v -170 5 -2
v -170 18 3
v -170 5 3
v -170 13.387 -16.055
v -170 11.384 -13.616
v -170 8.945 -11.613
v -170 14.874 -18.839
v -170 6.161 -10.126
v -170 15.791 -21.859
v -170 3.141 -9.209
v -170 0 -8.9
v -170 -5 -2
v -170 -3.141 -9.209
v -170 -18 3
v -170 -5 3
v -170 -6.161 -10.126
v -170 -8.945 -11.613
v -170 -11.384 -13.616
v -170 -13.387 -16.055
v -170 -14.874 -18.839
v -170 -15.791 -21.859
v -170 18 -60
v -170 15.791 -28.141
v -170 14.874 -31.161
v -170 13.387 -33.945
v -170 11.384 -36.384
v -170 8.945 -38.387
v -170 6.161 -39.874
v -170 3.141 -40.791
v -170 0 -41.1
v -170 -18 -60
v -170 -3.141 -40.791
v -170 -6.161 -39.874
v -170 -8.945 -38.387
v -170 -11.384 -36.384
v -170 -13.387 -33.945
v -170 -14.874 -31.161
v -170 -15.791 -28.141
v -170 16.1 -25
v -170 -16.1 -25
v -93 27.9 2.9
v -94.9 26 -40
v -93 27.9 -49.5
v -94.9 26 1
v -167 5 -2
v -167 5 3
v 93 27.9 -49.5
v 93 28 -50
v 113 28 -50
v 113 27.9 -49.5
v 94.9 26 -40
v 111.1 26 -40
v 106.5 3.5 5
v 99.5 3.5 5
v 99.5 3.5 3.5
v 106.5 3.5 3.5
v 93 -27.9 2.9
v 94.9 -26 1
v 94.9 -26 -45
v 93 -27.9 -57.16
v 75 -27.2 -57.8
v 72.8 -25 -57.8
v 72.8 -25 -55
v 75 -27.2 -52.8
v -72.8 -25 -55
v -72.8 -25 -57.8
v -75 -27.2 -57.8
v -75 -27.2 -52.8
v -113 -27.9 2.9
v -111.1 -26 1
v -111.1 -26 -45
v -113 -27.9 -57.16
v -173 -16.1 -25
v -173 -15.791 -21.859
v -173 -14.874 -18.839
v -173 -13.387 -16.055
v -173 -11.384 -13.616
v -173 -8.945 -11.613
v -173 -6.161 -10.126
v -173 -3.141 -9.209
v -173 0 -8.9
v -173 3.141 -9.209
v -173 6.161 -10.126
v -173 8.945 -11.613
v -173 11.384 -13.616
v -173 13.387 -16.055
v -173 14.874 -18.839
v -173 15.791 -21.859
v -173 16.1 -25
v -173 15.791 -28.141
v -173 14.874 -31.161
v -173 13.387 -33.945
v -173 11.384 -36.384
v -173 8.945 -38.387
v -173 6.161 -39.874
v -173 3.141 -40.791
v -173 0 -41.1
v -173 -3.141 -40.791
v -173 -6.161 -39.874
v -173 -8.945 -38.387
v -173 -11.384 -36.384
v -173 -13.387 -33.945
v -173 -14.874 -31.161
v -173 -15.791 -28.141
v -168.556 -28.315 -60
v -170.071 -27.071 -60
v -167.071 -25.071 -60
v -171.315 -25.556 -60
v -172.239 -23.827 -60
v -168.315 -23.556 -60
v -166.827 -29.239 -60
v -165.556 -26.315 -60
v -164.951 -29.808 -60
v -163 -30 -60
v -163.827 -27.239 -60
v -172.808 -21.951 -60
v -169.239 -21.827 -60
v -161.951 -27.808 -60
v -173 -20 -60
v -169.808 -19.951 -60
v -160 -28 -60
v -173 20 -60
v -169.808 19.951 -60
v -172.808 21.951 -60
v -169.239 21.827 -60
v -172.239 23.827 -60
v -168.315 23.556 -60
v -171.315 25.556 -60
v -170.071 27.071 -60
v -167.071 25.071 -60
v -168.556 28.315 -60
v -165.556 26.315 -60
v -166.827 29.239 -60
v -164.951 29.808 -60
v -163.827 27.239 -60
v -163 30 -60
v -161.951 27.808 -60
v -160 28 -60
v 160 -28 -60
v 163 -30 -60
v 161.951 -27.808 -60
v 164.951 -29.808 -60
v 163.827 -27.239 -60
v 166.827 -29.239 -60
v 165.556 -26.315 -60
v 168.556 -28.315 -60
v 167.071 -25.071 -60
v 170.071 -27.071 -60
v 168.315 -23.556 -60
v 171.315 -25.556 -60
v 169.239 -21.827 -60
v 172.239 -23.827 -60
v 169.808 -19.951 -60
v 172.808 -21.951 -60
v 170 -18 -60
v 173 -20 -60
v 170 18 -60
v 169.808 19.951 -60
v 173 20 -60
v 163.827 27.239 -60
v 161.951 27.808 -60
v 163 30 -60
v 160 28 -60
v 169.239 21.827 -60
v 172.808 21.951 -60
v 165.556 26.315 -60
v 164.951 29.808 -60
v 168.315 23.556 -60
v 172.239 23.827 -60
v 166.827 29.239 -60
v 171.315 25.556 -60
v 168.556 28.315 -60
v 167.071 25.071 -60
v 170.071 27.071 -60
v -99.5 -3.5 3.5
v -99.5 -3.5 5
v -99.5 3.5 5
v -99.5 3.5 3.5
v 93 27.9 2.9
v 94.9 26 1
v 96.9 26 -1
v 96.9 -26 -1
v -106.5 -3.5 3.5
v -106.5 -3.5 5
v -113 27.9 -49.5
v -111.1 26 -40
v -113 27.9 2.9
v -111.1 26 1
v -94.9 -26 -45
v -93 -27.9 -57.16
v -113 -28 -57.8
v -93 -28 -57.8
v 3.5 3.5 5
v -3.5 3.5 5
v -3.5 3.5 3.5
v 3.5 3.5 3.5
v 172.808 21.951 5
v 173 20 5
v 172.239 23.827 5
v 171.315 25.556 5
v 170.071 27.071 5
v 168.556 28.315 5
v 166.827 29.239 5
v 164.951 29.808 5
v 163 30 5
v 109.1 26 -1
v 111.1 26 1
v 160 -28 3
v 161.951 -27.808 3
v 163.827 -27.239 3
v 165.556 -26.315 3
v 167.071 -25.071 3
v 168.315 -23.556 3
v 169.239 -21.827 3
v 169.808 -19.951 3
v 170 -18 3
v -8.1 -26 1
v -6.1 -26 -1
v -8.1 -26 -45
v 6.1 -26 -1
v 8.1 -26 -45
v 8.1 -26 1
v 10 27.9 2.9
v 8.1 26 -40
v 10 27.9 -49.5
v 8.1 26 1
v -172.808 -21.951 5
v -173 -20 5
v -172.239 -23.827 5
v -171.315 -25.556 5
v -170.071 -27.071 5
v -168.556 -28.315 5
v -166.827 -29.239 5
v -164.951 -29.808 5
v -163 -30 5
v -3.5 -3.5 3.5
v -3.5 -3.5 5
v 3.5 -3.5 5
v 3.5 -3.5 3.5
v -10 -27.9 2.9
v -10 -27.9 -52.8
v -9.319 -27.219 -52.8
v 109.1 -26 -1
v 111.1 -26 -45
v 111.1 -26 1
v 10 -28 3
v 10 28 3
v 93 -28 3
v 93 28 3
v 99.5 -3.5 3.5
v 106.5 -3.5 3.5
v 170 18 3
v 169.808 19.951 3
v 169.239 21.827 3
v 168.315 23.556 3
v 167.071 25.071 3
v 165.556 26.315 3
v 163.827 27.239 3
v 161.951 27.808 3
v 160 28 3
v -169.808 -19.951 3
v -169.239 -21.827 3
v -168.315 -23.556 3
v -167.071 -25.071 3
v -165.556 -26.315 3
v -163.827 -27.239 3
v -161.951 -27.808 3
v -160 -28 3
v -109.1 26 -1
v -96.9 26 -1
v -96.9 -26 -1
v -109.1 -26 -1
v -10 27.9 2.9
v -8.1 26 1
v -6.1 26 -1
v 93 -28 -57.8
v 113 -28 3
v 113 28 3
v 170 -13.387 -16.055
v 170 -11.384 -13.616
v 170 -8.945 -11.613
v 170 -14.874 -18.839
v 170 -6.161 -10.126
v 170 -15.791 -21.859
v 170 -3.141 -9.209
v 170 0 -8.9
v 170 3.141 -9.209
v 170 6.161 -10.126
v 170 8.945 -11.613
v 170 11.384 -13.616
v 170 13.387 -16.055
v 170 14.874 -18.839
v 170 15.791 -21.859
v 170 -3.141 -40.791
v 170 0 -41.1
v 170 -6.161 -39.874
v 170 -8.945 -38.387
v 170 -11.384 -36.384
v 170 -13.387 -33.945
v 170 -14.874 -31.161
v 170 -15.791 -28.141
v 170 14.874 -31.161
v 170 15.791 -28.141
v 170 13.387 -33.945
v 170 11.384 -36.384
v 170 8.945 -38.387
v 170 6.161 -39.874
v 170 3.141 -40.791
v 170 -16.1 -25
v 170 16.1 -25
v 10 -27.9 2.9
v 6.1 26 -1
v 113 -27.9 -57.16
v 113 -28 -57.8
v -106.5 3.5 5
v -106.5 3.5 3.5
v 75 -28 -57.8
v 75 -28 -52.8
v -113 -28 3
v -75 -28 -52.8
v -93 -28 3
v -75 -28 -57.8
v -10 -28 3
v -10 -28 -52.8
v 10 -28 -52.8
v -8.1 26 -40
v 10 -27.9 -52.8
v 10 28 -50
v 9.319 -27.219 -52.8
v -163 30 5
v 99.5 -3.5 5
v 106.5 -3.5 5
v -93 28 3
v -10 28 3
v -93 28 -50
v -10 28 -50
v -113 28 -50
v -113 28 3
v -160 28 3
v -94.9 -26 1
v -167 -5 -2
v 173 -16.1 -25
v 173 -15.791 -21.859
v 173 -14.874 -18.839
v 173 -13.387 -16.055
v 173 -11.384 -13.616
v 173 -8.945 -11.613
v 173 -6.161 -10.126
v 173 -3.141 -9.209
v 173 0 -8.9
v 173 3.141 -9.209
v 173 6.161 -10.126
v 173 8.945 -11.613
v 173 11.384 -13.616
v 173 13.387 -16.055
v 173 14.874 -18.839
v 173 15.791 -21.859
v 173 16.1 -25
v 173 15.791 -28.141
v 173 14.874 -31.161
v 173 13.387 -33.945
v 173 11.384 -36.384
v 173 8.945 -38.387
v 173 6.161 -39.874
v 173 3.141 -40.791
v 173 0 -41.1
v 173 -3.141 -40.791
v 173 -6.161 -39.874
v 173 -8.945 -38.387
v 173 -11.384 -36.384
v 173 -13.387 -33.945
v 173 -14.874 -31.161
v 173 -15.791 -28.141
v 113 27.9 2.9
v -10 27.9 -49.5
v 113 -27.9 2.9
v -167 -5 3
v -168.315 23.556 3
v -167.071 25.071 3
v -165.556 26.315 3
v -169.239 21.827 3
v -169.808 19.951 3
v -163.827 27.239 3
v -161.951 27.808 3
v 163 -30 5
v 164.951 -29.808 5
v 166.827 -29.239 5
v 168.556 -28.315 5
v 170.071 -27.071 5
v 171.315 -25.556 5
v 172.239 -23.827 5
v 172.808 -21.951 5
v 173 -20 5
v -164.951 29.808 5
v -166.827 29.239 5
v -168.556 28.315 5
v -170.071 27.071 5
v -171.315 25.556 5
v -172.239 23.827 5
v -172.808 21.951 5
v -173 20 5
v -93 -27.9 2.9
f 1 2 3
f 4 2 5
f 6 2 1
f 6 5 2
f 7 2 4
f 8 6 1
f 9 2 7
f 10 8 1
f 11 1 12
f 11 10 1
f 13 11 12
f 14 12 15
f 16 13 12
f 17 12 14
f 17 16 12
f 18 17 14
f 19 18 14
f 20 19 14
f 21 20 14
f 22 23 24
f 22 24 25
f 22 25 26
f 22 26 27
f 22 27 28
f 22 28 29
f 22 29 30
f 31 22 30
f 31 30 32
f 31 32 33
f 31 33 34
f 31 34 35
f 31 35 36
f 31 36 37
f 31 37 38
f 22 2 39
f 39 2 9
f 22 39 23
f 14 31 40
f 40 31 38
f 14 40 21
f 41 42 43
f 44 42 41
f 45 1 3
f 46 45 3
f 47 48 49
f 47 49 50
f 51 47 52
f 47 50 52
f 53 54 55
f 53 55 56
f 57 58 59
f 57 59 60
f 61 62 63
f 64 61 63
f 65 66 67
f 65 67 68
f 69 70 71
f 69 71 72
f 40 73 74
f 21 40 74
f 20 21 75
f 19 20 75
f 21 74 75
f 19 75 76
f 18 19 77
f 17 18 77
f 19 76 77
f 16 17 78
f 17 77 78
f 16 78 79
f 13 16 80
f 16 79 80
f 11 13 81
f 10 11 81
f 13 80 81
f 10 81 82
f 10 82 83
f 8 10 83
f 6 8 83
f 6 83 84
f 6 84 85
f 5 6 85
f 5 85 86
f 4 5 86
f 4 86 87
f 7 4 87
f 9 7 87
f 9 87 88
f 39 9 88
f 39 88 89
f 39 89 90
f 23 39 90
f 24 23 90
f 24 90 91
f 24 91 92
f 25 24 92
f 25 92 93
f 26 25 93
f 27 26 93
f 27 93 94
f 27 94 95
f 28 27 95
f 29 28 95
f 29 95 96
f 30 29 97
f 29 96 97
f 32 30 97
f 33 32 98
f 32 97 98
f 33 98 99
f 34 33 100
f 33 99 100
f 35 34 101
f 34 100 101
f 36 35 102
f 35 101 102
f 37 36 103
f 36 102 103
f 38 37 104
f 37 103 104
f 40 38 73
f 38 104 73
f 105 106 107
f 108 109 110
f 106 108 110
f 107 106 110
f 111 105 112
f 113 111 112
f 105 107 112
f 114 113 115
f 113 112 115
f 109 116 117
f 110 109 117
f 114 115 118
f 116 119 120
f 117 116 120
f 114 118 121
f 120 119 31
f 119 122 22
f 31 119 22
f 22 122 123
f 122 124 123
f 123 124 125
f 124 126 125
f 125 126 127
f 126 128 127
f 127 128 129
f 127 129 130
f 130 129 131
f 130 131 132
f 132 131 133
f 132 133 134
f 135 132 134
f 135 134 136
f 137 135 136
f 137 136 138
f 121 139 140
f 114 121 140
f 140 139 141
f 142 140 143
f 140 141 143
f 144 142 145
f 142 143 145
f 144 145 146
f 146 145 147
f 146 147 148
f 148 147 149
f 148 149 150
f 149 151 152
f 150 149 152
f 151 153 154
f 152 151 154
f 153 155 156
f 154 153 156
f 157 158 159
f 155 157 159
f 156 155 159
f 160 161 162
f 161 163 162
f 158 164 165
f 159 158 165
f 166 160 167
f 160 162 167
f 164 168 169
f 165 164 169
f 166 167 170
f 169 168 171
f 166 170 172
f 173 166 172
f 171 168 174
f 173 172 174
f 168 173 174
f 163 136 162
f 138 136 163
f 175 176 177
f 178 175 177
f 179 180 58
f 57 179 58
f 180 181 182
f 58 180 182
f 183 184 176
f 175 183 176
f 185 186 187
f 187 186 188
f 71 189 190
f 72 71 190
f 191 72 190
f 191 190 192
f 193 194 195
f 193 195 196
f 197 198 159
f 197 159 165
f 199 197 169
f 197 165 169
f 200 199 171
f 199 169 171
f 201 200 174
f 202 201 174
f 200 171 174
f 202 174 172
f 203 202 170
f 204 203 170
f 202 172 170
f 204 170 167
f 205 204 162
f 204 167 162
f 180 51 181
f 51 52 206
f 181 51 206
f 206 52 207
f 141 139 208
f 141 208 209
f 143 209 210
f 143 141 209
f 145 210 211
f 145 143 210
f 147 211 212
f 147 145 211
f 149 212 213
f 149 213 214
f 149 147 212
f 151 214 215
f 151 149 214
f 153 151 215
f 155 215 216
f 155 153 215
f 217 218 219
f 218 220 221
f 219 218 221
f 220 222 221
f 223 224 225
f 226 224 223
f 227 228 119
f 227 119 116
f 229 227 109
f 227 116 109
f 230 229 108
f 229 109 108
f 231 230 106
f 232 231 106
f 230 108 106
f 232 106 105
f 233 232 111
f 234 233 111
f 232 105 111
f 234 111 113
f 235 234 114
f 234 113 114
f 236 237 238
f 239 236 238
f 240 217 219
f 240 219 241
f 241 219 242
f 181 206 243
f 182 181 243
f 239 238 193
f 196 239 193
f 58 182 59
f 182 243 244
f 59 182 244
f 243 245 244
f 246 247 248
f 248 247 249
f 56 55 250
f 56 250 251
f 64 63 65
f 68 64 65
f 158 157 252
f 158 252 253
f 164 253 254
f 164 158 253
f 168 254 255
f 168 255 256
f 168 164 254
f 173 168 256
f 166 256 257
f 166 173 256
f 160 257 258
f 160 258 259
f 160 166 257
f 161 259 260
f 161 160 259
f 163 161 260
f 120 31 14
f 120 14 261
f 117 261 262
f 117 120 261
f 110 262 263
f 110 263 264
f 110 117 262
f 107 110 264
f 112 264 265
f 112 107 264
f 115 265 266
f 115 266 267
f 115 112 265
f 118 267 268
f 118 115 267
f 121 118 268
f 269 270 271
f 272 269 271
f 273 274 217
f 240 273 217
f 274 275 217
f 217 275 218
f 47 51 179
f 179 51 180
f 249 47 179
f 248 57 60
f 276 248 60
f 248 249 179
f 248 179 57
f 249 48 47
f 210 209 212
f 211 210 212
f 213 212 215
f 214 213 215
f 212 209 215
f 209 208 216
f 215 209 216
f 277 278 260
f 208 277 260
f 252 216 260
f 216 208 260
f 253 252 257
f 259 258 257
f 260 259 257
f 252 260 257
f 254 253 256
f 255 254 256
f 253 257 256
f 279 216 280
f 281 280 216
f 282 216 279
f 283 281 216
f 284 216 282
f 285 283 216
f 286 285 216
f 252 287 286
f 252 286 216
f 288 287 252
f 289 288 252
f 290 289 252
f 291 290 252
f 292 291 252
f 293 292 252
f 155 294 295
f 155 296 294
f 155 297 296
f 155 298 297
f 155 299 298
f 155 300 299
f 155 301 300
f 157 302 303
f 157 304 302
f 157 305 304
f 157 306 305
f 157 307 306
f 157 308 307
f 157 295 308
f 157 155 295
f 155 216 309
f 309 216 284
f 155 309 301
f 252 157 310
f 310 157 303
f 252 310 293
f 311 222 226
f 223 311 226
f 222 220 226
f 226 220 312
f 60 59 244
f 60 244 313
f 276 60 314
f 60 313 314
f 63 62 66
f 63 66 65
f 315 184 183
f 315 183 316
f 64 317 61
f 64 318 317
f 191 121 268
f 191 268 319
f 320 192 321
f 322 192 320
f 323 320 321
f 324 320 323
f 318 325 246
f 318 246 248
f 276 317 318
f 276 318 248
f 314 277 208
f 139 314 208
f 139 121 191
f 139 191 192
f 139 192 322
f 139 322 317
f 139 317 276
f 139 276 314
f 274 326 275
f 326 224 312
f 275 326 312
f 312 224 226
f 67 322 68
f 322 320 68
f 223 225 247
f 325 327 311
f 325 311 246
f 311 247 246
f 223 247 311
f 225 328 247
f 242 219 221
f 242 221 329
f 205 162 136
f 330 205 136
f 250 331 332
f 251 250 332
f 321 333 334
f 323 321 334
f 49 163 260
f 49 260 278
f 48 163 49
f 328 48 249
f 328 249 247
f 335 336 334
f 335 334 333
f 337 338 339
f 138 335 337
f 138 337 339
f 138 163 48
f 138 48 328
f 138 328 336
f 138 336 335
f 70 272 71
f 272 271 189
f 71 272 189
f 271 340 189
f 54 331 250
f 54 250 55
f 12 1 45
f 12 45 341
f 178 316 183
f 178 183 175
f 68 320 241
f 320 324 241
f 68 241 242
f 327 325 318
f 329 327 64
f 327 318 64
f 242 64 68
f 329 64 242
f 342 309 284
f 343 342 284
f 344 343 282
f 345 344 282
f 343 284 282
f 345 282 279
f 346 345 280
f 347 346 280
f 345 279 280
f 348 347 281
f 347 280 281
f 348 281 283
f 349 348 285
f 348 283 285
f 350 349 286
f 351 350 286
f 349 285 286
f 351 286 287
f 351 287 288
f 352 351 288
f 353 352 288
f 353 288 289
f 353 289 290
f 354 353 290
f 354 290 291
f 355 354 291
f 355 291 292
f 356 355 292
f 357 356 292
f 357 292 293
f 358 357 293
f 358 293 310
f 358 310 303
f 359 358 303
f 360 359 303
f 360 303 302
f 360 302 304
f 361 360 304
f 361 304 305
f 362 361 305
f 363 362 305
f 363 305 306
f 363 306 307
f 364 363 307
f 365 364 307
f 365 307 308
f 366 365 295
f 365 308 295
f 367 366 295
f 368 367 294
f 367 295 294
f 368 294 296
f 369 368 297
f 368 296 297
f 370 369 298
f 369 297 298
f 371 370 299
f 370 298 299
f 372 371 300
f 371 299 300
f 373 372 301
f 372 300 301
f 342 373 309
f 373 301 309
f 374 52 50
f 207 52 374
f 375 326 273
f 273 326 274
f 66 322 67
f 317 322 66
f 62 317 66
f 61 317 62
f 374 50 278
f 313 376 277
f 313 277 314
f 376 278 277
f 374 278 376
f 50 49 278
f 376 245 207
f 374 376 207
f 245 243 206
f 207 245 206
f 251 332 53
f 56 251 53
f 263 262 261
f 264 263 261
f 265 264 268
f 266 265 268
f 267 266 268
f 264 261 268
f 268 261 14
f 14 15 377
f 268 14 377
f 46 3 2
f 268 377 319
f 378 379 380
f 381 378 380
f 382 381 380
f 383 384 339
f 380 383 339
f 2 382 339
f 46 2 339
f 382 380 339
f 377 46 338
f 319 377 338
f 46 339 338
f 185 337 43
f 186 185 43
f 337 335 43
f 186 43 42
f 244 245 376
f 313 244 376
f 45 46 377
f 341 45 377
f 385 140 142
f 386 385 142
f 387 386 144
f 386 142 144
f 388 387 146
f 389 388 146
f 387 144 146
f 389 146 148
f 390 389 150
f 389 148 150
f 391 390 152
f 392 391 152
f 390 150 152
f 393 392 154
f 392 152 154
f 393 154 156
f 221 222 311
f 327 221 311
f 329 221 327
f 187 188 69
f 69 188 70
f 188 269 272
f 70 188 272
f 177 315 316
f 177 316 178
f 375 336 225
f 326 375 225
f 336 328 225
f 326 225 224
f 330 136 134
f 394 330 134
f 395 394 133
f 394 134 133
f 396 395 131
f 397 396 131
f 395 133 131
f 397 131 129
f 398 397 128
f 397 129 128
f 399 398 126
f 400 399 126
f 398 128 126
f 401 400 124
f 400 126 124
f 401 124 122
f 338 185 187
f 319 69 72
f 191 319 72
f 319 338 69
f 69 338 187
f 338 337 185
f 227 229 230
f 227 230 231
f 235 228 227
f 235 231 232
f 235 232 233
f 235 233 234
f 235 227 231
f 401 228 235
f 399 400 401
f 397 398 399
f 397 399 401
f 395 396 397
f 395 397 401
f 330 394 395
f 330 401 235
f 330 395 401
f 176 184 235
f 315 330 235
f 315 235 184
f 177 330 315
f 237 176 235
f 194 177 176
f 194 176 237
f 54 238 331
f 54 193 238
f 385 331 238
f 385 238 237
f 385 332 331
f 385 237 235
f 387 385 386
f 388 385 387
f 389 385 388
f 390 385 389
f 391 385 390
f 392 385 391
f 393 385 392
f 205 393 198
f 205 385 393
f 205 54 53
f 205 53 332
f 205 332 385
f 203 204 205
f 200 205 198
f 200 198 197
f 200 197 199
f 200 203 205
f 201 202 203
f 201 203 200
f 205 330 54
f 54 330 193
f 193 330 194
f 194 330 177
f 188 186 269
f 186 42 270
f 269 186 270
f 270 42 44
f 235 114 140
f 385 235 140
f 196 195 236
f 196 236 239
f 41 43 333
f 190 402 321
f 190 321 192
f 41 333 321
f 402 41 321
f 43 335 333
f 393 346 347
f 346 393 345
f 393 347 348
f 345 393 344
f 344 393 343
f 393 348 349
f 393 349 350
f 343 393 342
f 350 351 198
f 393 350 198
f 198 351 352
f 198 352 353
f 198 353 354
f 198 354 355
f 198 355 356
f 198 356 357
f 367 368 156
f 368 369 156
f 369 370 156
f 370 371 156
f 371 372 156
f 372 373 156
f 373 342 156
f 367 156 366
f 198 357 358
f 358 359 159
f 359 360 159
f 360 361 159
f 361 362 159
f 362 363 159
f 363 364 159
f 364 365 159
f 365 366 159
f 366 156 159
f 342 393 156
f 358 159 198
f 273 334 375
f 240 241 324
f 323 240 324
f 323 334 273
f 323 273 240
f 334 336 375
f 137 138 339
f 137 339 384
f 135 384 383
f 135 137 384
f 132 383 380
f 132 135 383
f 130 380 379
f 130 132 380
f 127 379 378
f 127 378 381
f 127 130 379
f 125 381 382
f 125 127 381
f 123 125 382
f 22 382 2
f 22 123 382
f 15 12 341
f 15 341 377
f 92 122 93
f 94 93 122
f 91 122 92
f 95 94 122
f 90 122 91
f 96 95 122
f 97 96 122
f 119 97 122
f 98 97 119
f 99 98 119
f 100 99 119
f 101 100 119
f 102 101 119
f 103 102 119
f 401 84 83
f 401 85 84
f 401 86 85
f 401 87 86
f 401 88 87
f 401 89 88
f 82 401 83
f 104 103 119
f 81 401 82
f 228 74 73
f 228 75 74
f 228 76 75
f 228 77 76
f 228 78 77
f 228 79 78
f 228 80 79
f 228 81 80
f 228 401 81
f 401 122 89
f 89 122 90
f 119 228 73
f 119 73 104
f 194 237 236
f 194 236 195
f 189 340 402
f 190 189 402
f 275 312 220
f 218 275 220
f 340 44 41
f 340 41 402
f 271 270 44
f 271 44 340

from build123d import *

# Parameters (mm, degrees)
PAD006_DEPTH           = 65
POCKET_DEPTH           = 63
SKETCH009_R            = 16.1
POCKET005_DEPTH        = 346.001
PAD009_DEPTH           = 10
LINEARPATTERN_COUNT    = 2
LINEARPATTERN_PITCH    = 103
LINEARPATTERN001_COUNT = 2
LINEARPATTERN001_PITCH = 103
SKETCH016_W            = 3
SKETCH016_H            = 5
PAD010_DEPTH           = 75
SKETCH020_W            = 10
SKETCH020_H            = 5
PAD011_DEPTH           = 6
CHAMFER001_SIZE        = 1.9
SKETCH021_W            = 7
SKETCH021_H            = 7
POCKET007_DEPTH        = 1.5
LINEARPATTERN002_COUNT = 2
LINEARPATTERN002_PITCH = 103
LINEARPATTERN003_COUNT = 2
LINEARPATTERN003_PITCH = 103
CHAMFER003_SIZE        = 2.2
CHAMFER008_SIZE        = 3.9


with BuildPart() as part:
    # Sketch007 → Pad006 (new body)
    with BuildSketch(Plane.XY):
        with BuildLine():
            Line((-173, 20), (-173, -20))
            ThreePointArc((-173, -20), (-170.071068, -27.071068), (-163, -30))
            Line((-163, -30), (163, -30))
            ThreePointArc((163, -30), (170.071068, -27.071068), (173, -20))
            Line((173, -20), (173, 20))
            ThreePointArc((173, 20), (170.071068, 27.071068), (163, 30))
            Line((163, 30), (-163, 30))
            ThreePointArc((-163, 30), (-170.071068, 27.071068), (-173, 20))
        make_face()
    extrude(amount=PAD006_DEPTH)

    # Sketch008 → Pocket (cut)
    with BuildSketch(Plane.XY):
        with BuildLine():
            Line((-170, 18), (-170, -18))
            ThreePointArc((-170, -18), (-167.071068, -25.071068), (-160, -28))
            Line((-160, -28), (160, -28))
            ThreePointArc((160, -28), (167.071068, -25.071068), (170, -18))
            Line((170, -18), (170, 18))
            ThreePointArc((170, 18), (167.071068, 25.071068), (160, 28))
            Line((160, 28), (-160, 28))
            ThreePointArc((-160, 28), (-167.071068, 25.071068), (-170, 18))
        make_face()
    extrude(amount=POCKET_DEPTH, mode=Mode.SUBTRACT)

    # Sketch009 → Pocket005 (cut, through all)
    with BuildSketch(Plane(origin=(-173, 0, 0), x_dir=(0, -1, 0), z_dir=(-1, 0, 0))):
        with Locations((0, 35)):
            Circle(SKETCH009_R)
    extrude(amount=-POCKET005_DEPTH, mode=Mode.SUBTRACT)

    # Sketch017 → Pad009 (join, symmetric)
    with BuildSketch(Plane.YZ):
        Polygon((-28, 63), (28, 63), (28, 10), (26, 20), (26, 59), (-26, 59), (-26, 15), (-28, 2.2), align=None)
    pad009 = extrude(amount=PAD009_DEPTH, both=True)

    # LinearPattern: Pad009 ×2
    with Locations(*[(-i * LINEARPATTERN_PITCH, 0, 0) for i in range(1, LINEARPATTERN_COUNT)]):
        add(pad009)

    # LinearPattern001: Pad009 ×2
    with Locations(*[(i * LINEARPATTERN001_PITCH, 0, 0) for i in range(1, LINEARPATTERN001_COUNT)]):
        add(pad009)

    # Sketch016 → Pad010 (join, symmetric)
    with BuildSketch(Plane.YZ):
        with Locations((-26.5, 4.7)):
            Rectangle(SKETCH016_W, SKETCH016_H)
    extrude(amount=PAD010_DEPTH, both=True)

    # Sketch020 (on Face1 of Pad010) → Pad011 (join)
    with BuildSketch(Plane(origin=(-173, 0, 0), x_dir=(0, -1, 0), z_dir=(-1, 0, 0))):
        with Locations((0, 60.5)):
            Rectangle(SKETCH020_W, SKETCH020_H)
    extrude(amount=-PAD011_DEPTH)

    # Chamfer001
    chamfer001_edges = [part.edges().sort_by_distance(p)[0] for p in [
        (113, -26, 37),
        (113, 26, 39.5),
        (10, 26, 39.5),
        (10, -26, 37),
        (-93, -26, 37),
        (-93, 26, 39.5),
        (-113, 26, 39.5),
        (-113, -26, 37),
        (-10, -26, 37),
        (-10, 26, 39.5),
        (93, 26, 39.5),
        (93, -26, 37),
    ]]
    chamfer(chamfer001_edges, length=CHAMFER001_SIZE)

    # Sketch021 → Pocket007 (cut)
    with BuildSketch(Plane.XY.offset(65)):
        Rectangle(SKETCH021_W, SKETCH021_H)
    pocket007 = extrude(amount=-POCKET007_DEPTH, mode=Mode.SUBTRACT)

    # LinearPattern002: Pocket007 ×2
    with Locations(*[(i * LINEARPATTERN002_PITCH, 0, 0) for i in range(1, LINEARPATTERN002_COUNT)]):
        add(pocket007, mode=Mode.SUBTRACT)

    # LinearPattern003: Pocket007 ×2
    with Locations(*[(-i * LINEARPATTERN003_PITCH, 0, 0) for i in range(1, LINEARPATTERN003_COUNT)]):
        add(pocket007, mode=Mode.SUBTRACT)

    # Chamfer003
    chamfer003_edges = [part.edges().sort_by_distance(p)[0] for p in [
        (75, -25, 4.7),
        (0, -25, 7.2),
        (-75, -25, 4.7),
    ]]
    chamfer(chamfer003_edges, length=CHAMFER003_SIZE)

    # Chamfer008
    chamfer008_edges = [part.edges().sort_by_distance(p)[0] for p in [
        (113, 0, 59),
        (93, 0, 59),
        (10, 0, 59),
        (-10, 0, 59),
        (-93, 0, 59),
        (-113, 0, 59),
    ]]
    chamfer(chamfer008_edges, length=CHAMFER008_SIZE)


with BuildPart() as part_1:
    # Body002 placement: moved
    add(part.part.moved(Location((0, 0, -60))))


solid = part_1.part
